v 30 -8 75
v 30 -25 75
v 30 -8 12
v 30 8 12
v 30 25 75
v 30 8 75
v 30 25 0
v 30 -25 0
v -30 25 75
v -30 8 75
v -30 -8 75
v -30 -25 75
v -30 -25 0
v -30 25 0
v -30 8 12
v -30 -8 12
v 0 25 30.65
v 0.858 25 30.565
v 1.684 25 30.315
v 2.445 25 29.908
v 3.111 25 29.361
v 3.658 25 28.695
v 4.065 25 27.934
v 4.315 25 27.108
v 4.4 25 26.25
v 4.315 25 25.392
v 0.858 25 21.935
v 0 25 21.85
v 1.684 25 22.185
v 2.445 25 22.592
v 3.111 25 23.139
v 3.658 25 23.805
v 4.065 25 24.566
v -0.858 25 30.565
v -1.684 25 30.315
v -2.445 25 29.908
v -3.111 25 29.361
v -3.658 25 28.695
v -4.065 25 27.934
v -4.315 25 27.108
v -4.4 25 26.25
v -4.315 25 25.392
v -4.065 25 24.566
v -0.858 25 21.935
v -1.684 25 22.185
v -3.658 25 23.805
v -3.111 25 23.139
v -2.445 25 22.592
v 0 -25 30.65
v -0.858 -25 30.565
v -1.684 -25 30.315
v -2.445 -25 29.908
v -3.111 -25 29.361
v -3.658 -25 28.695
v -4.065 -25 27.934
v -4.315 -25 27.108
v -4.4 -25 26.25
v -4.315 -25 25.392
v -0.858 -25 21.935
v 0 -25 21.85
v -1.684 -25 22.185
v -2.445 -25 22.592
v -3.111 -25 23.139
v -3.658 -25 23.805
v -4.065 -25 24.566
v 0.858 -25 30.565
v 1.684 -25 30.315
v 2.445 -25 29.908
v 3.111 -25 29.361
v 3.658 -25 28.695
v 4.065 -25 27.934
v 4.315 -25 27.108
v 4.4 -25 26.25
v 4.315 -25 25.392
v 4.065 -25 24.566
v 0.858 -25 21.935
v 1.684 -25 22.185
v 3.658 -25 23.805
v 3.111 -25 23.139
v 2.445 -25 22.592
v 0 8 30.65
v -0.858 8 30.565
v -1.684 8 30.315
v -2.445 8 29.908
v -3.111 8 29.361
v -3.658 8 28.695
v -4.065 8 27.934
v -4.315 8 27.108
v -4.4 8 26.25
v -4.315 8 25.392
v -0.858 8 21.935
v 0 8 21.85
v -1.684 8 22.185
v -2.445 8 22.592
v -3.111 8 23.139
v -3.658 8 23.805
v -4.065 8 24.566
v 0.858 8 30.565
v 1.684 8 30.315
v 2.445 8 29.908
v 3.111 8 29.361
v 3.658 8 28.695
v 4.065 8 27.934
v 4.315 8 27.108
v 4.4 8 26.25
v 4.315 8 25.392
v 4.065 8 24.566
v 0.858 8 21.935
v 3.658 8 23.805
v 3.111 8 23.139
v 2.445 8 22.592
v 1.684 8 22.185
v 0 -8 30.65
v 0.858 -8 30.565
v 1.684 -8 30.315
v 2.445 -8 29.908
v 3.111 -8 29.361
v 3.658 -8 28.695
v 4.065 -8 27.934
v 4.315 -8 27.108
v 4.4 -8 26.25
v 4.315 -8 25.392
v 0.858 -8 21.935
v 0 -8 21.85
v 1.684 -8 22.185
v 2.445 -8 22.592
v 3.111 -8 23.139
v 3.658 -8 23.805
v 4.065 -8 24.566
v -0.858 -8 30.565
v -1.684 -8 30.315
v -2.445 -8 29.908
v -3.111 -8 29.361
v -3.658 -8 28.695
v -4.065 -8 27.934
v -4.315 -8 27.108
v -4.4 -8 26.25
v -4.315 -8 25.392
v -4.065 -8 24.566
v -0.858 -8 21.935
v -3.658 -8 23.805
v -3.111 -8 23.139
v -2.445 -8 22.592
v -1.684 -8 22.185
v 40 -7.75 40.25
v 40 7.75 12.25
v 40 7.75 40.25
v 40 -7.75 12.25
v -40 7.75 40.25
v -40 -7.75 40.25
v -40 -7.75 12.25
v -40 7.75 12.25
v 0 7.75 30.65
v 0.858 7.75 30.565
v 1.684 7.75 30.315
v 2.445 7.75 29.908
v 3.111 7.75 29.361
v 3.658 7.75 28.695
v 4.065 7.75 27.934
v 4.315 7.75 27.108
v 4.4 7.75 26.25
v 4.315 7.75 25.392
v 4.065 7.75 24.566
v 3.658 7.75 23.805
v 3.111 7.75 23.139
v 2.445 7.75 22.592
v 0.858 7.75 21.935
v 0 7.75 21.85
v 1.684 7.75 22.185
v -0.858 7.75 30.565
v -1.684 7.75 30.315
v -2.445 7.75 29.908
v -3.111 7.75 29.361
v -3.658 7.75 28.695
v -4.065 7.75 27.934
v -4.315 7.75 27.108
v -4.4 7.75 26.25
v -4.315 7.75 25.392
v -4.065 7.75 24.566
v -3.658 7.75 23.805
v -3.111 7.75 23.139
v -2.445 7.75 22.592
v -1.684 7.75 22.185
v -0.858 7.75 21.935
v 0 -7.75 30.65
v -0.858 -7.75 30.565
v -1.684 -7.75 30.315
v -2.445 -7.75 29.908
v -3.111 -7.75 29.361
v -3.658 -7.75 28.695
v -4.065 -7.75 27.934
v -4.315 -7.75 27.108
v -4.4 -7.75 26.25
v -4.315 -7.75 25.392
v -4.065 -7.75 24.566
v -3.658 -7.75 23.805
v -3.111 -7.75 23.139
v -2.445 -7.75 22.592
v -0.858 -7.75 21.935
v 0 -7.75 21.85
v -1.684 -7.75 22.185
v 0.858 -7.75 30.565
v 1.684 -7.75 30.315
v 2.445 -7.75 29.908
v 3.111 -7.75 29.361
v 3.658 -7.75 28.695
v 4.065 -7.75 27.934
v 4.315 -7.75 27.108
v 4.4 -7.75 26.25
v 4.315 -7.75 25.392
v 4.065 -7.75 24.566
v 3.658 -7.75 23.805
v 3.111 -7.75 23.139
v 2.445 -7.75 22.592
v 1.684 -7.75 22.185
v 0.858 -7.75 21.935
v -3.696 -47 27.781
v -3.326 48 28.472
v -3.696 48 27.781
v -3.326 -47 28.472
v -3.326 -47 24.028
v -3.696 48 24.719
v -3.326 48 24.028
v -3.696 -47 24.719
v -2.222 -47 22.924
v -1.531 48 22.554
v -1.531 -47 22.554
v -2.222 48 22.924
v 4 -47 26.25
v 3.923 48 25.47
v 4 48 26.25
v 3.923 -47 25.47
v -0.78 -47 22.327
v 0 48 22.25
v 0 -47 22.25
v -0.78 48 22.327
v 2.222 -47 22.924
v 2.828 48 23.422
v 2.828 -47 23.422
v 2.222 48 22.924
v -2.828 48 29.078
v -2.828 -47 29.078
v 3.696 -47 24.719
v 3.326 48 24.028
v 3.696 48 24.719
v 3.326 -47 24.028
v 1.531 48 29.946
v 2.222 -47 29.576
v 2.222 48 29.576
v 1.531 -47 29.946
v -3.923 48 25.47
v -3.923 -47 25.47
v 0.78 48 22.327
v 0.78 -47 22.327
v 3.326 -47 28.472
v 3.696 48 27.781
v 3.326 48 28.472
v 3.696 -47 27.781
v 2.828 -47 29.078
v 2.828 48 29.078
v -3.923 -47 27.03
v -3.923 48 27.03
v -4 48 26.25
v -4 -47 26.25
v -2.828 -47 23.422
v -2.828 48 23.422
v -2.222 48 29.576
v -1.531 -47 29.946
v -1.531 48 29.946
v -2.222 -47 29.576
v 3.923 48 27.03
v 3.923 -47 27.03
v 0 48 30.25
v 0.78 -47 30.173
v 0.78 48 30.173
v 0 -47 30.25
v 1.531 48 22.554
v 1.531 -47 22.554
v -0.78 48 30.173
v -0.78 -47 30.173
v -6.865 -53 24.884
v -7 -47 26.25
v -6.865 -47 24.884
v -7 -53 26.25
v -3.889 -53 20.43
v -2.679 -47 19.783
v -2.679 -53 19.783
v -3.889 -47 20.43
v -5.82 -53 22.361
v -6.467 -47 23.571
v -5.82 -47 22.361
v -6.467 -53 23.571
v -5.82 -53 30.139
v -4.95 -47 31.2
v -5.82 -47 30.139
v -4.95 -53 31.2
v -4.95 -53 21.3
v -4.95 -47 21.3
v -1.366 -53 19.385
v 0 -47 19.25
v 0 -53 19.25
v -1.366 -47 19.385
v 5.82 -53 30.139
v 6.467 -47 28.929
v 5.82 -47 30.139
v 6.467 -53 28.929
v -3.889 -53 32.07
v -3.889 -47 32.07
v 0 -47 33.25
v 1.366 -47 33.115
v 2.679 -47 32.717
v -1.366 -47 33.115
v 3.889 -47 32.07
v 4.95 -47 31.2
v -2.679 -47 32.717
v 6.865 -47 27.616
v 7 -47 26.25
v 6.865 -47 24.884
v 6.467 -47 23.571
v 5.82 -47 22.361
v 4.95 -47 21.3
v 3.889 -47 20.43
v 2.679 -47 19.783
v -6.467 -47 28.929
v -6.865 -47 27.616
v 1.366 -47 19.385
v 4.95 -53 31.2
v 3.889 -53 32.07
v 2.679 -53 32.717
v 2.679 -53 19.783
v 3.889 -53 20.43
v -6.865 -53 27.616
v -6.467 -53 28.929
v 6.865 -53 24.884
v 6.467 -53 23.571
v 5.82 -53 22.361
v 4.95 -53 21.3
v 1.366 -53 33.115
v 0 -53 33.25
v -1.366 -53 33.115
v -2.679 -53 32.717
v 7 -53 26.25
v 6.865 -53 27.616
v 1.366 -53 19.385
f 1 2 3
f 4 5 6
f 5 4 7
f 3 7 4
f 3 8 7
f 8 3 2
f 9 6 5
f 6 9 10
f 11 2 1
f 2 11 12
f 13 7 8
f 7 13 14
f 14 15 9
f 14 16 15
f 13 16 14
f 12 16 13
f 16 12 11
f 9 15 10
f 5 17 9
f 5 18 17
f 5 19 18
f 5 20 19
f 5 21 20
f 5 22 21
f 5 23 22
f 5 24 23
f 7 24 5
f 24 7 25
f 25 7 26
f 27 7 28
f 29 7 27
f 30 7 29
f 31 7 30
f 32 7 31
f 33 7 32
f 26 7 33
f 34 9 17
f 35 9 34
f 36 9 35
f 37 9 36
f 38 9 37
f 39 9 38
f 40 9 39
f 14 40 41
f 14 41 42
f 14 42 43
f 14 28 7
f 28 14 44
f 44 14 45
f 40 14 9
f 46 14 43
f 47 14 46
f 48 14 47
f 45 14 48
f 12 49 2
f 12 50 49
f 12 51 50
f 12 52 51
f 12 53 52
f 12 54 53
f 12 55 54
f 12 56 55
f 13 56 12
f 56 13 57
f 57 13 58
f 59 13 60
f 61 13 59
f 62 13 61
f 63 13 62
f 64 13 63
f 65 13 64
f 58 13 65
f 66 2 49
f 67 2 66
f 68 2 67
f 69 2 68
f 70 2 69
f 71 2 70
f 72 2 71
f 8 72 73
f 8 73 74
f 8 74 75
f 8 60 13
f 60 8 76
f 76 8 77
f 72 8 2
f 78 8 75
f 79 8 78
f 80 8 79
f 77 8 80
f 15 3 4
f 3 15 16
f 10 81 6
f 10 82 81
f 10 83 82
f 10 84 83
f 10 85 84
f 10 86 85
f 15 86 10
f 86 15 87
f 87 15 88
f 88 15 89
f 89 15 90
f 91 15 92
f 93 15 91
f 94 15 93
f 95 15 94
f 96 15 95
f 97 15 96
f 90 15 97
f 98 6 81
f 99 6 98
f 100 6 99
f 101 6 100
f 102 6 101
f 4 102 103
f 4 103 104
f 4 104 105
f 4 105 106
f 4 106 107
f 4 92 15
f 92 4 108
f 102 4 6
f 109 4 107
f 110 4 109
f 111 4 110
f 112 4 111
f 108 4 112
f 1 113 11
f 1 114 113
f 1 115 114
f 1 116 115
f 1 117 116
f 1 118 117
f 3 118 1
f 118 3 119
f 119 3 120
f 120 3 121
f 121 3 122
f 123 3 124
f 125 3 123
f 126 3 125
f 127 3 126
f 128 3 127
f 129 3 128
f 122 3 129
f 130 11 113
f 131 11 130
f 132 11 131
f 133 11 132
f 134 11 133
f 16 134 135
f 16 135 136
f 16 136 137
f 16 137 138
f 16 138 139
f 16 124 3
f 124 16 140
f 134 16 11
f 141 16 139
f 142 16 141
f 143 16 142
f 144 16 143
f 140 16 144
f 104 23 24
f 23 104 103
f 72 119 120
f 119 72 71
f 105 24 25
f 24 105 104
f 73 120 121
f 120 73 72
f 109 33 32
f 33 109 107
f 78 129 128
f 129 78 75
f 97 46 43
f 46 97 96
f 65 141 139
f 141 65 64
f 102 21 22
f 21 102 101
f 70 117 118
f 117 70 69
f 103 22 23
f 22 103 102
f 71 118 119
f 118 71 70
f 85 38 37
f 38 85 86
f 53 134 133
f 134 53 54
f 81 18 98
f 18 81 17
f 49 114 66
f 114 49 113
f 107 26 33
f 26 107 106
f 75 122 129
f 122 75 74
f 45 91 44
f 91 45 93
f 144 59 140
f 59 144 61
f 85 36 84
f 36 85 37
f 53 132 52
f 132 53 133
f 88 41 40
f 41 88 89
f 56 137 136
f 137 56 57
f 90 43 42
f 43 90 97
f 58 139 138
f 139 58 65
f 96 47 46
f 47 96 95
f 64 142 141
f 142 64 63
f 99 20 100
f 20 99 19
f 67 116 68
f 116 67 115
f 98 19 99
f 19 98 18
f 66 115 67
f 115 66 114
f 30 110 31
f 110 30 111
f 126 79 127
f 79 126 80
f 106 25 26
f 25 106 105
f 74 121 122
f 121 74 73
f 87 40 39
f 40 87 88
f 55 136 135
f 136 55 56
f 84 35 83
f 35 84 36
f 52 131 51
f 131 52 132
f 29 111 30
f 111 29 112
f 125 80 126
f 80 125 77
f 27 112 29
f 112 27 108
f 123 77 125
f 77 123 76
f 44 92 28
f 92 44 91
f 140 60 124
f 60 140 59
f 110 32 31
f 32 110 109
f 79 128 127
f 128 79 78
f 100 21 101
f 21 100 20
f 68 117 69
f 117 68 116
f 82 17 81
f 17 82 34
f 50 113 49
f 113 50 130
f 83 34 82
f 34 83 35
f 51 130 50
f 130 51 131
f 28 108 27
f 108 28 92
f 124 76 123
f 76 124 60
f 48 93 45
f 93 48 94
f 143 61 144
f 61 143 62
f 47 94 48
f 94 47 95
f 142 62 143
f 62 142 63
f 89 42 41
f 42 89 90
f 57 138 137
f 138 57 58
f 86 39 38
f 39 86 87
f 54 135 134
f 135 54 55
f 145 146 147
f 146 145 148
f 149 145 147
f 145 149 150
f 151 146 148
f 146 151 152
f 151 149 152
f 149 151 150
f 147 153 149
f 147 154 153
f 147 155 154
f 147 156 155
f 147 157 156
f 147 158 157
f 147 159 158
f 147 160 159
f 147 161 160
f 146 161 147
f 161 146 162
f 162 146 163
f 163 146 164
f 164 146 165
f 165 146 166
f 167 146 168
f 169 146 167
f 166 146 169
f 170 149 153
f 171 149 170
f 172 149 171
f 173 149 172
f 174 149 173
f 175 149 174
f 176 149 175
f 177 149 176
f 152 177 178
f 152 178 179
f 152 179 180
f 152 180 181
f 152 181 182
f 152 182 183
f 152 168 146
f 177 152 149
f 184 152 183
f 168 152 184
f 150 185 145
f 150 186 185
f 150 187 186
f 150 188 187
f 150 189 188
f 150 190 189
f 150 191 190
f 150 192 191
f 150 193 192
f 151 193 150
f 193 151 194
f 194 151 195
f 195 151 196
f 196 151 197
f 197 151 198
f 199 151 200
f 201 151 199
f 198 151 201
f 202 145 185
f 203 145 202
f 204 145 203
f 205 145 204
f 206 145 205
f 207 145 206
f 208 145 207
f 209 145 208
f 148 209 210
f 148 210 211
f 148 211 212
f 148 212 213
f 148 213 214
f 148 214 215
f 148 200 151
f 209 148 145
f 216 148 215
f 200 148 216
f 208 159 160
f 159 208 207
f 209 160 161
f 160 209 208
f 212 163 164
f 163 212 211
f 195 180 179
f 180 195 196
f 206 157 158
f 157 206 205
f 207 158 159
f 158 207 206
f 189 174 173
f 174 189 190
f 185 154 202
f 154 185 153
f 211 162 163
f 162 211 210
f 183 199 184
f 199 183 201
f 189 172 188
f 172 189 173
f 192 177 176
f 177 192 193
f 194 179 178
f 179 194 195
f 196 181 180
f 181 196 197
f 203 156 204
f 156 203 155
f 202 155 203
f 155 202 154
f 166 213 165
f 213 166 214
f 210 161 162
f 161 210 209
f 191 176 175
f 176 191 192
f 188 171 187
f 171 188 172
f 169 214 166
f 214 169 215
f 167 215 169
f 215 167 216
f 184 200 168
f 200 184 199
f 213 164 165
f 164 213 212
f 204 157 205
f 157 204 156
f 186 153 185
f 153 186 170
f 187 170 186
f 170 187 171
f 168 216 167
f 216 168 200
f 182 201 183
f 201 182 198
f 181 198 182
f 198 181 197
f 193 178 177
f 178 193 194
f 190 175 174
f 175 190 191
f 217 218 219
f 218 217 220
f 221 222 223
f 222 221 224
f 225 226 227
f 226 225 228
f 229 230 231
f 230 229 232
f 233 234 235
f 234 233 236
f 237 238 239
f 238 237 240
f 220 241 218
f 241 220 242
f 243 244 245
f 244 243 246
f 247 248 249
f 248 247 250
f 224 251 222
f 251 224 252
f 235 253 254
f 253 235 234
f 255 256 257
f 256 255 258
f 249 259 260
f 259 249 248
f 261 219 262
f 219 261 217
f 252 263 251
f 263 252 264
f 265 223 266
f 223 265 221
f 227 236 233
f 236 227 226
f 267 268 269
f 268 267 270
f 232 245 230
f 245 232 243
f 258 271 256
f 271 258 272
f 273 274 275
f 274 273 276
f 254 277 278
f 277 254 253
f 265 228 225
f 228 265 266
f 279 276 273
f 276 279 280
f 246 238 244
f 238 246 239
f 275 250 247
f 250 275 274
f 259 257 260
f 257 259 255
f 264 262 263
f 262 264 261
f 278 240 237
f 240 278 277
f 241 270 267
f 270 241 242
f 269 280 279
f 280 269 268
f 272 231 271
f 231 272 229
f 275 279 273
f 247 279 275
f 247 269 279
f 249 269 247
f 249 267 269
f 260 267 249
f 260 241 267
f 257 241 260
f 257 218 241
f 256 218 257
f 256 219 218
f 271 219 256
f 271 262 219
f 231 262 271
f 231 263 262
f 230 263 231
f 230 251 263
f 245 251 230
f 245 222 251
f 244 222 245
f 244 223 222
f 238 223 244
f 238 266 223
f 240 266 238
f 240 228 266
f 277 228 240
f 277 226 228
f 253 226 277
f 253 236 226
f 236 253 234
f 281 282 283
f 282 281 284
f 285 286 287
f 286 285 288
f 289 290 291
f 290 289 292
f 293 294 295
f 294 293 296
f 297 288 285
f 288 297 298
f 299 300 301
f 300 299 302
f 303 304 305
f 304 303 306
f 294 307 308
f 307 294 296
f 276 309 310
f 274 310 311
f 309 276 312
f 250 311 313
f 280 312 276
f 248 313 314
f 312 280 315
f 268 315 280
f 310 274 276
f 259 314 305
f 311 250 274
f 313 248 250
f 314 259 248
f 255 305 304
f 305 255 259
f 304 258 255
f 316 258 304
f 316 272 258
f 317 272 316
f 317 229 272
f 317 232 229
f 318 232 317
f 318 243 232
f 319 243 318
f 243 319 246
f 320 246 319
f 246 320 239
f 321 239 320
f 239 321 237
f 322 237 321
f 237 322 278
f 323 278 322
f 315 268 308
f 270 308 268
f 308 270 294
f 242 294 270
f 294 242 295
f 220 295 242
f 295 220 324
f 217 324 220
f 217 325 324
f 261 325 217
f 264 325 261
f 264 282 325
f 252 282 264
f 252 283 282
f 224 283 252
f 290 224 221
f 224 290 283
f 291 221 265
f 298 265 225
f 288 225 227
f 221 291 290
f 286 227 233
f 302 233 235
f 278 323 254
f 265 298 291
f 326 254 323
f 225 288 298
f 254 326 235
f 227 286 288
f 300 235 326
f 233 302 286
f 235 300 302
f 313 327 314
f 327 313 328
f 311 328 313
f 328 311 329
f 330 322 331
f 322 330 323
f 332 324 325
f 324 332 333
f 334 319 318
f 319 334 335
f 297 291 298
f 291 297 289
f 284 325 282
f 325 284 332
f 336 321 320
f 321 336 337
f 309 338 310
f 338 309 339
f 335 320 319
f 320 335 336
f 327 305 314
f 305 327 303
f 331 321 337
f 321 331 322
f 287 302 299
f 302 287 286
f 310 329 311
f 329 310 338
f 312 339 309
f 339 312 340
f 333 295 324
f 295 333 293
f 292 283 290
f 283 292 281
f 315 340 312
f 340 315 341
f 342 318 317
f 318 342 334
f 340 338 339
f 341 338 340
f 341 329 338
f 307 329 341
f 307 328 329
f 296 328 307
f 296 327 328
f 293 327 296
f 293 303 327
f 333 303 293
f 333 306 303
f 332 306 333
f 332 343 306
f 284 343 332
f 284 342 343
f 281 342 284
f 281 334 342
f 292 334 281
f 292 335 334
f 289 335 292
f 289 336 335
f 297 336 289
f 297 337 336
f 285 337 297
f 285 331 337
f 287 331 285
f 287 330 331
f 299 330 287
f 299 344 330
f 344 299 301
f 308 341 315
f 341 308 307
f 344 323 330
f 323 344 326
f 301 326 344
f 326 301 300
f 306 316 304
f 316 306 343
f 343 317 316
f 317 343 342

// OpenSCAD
$fn = 32;

// ------------------------------------------------------------------------
// Clevis joint: 60 mm clevis, pin d8
// Every part is its own module, assembly() places them once.
// ------------------------------------------------------------------------

// --- part 1 ---
module clevis() {
  difference() {
    translate([-30, -25, 0]) cube([60, 50, 75]);
    translate([-31, -8, 12]) cube([62, 16, 64]);
    translate([0, 0, 26.25]) rotate([90, 0, 0]) cylinder(h = 52, d = 8.8, center = true);
  }
}

// --- part 2 ---
module eye() {
  difference() {
    translate([-40, -7.75, 0]) cube([80, 15.5, 28]);
    translate([0, 0, 14]) rotate([90, 0, 0]) cylinder(h = 17.5, d = 8.8, center = true);
  }
}

// --- part 3 ---
module pin() {
  rotate([0, 90, 0]) cylinder(h = 96, d = 8, center = true);
  translate([-53, 0, 0]) rotate([0, 90, 0]) cylinder(h = 6, d = 14);
}

// --- assembly ---
module assembly() {
  translate([0, 0, 0]) rotate([0, 0, 0]) clevis();
  translate([0, 0, 12.25]) rotate([0, 0, 0]) eye();
  translate([0, 0, 26.25]) rotate([0, 0, 90]) pin();
}

assembly();
